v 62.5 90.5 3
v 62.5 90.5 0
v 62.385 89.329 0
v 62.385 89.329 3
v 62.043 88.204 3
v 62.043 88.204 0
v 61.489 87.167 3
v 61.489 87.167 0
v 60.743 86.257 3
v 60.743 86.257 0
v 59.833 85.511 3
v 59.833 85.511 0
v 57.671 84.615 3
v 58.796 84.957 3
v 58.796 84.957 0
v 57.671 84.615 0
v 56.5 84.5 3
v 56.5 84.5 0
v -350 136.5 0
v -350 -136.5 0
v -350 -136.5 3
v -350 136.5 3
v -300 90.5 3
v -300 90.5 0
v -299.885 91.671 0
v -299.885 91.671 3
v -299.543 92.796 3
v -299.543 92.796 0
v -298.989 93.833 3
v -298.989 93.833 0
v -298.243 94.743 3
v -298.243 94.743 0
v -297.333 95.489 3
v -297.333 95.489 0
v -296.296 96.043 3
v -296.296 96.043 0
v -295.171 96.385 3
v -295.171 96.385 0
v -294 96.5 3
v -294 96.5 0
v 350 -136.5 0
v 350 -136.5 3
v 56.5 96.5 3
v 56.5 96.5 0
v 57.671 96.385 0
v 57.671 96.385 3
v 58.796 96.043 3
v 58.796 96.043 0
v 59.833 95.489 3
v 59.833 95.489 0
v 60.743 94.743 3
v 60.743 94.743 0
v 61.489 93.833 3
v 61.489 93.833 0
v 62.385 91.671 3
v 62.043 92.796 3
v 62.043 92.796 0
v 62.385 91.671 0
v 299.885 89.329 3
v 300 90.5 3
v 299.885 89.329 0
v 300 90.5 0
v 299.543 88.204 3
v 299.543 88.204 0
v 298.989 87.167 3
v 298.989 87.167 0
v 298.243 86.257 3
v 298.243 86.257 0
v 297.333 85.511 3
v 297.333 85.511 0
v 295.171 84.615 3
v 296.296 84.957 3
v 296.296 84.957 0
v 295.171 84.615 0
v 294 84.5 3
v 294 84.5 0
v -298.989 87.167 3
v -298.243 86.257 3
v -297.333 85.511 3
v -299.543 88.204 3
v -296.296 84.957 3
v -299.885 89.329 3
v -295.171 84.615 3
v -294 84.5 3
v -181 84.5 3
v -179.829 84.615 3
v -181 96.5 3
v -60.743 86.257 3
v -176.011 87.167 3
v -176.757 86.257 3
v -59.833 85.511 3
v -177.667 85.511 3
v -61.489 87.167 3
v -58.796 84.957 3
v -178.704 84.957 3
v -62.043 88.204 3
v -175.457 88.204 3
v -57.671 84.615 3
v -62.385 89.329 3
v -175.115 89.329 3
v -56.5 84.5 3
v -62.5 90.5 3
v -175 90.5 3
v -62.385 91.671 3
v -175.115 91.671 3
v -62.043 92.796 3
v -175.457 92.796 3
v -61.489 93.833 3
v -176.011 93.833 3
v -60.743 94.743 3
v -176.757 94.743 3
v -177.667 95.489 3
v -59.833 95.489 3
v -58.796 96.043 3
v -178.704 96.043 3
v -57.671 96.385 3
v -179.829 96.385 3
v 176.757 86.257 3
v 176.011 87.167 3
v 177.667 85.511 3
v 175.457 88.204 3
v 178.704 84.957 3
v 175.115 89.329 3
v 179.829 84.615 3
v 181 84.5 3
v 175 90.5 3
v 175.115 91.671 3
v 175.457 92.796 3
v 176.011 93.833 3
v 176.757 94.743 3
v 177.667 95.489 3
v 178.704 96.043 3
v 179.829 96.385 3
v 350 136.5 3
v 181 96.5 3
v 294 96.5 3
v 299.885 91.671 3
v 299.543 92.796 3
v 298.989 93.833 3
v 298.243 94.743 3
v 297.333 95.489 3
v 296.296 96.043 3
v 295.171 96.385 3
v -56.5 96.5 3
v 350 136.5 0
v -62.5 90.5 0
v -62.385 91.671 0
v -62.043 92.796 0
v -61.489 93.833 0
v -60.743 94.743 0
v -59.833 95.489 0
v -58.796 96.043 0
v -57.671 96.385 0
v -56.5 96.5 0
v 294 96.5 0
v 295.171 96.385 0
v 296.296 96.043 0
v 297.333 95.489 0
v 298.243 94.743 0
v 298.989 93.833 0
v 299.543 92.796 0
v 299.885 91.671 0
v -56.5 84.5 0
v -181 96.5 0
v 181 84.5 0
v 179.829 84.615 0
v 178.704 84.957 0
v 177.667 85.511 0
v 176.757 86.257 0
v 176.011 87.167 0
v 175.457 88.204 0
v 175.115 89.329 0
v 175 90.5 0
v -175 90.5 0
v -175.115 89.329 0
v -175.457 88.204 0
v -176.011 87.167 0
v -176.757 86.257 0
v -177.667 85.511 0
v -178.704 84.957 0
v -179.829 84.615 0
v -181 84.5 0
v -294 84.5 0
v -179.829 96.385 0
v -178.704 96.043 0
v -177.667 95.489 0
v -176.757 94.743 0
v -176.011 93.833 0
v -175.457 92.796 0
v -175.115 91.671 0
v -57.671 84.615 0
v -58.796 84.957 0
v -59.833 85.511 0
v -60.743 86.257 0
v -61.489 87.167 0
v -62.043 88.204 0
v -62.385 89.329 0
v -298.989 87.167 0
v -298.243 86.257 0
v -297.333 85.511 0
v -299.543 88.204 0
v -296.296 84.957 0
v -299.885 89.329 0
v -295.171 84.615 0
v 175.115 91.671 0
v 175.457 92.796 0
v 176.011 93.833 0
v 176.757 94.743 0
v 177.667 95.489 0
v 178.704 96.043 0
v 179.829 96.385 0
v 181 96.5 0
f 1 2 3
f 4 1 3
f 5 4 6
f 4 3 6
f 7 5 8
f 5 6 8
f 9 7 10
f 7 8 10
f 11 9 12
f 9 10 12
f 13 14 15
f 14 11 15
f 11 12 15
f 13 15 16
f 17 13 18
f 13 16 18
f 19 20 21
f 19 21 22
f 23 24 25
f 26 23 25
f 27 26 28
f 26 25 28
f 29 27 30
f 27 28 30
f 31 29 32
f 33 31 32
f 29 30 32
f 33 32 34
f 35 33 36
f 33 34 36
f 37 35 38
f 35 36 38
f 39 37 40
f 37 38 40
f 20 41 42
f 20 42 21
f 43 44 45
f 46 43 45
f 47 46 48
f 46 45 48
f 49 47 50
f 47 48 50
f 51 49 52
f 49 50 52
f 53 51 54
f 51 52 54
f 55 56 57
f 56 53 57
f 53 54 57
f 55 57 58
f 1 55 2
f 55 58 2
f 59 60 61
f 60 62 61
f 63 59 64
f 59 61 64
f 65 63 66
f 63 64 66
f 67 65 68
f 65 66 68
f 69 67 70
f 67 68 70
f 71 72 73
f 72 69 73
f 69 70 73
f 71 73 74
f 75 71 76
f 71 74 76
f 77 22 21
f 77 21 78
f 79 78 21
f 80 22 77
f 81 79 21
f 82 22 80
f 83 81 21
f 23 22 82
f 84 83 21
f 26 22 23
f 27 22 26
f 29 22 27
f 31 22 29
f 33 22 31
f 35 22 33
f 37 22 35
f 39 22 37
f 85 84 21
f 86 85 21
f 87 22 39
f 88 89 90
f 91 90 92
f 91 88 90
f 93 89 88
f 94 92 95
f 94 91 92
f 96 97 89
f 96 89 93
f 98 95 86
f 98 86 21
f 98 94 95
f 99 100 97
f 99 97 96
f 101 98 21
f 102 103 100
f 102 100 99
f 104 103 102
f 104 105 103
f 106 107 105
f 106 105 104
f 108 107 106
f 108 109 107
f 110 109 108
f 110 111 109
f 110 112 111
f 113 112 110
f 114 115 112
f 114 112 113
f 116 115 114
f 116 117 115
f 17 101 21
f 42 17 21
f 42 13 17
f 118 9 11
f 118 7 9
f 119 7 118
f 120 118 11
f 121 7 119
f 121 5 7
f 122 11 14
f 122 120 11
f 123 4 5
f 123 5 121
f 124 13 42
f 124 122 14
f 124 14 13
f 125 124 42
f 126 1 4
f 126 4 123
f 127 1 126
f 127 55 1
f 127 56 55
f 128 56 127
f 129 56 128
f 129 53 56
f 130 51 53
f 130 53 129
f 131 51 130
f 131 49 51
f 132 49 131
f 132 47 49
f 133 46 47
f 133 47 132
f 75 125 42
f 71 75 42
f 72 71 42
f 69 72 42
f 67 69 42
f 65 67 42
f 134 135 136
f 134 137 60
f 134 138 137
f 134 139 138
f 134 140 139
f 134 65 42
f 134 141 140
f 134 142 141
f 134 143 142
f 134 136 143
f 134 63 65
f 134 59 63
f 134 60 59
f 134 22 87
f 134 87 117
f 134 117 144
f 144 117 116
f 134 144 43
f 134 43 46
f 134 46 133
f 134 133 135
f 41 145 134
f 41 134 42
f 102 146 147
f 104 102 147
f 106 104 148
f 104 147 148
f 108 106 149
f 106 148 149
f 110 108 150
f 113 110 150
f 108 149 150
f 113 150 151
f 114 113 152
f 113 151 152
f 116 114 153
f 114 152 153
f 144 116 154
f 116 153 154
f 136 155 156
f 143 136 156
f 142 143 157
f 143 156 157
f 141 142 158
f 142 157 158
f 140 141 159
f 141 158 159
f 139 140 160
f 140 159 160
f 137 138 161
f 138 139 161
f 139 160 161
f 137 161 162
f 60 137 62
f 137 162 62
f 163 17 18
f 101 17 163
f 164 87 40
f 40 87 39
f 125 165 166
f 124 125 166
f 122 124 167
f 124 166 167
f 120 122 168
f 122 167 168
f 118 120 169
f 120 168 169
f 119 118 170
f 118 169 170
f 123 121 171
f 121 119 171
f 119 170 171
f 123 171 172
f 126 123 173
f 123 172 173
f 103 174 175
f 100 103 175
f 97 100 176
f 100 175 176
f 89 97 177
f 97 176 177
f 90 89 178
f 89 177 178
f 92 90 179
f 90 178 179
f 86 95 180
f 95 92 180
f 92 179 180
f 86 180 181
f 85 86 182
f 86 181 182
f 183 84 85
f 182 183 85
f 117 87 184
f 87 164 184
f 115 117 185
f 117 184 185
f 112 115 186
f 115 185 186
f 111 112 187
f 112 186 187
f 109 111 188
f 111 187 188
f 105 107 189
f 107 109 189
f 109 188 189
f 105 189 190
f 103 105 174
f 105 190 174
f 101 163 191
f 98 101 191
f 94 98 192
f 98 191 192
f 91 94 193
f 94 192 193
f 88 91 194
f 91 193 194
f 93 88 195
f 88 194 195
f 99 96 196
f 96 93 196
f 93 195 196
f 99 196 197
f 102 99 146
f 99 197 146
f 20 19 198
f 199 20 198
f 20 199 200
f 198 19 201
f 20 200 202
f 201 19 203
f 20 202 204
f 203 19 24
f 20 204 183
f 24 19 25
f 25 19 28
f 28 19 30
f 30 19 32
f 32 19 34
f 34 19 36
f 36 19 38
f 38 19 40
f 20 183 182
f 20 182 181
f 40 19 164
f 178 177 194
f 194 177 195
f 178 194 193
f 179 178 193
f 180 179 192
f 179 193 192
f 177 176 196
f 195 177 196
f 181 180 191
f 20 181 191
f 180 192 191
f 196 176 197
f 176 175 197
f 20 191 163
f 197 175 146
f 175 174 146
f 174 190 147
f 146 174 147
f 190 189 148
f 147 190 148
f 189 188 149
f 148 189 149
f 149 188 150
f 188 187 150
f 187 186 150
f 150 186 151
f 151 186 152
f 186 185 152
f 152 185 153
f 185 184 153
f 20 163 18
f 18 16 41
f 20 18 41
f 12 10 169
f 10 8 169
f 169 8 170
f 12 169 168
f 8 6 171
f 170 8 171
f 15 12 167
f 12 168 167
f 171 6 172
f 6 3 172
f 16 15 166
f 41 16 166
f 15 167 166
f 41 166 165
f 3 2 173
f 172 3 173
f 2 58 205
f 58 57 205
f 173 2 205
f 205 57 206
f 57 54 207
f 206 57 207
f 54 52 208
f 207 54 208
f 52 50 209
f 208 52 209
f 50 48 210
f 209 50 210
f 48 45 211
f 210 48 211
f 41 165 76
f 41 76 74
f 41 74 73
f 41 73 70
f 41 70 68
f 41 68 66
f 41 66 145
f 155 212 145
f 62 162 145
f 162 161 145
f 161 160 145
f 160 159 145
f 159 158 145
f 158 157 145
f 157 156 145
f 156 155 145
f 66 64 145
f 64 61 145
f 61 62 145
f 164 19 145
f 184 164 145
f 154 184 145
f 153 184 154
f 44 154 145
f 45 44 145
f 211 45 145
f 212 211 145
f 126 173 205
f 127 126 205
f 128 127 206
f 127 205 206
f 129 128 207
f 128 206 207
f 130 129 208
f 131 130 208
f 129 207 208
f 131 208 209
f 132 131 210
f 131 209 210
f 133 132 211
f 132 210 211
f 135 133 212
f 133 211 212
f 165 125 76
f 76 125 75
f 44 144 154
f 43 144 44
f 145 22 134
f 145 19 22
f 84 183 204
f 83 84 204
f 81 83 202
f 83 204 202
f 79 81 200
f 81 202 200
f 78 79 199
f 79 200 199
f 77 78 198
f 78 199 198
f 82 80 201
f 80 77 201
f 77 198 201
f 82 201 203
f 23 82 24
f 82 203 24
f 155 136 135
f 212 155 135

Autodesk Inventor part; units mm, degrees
ref_plane "YZ Plane" through (0, 0, 0) normal (1, 0, 0) x (0, 1, 0)
ref_plane "XZ Plane" through (0, 0, 0) normal (0, 1, 0) x (-1, 0, 0)
ref_plane "XY Plane" through (0, 0, 0) normal (0, 0, 1) x (1, 0, 0)
sketch "Sketch1" plane through (0, 0, 0) normal (0, 0, 1) x (1, 0, 0)
  line L0 (350, -136.5) -> (-350, -136.5)
  line L1 (-350, -136.5) -> (-350, 136.5)
  line L2 (-350, 136.5) -> (350, 136.5)
  line L3 (350, 136.5) -> (350, -136.5)
  line L4 (350, -136.5) -> (-350, 136.5) construction
  line L5 (-350, -136.5) -> (350, 136.5) construction
  point P0 (0, 0)
  dimension "d0" = 273
  dimension "d1" = 700
extrude "Extrusion1" add sketch "Sketch1" along normal blind 3
sketch "Sketch5" plane through (0, 0, 3) normal (0, 0, 1) x (1, 0, 0)
  line L0 (-300, 84.5) -> (-175, 84.5)
  line L1 (-175, 84.5) -> (-175, 96.5)
  line L2 (-175, 96.5) -> (-300, 96.5)
  line L3 (-300, 96.5) -> (-300, 84.5)
  line L4 (-62.5, 96.5) -> (62.5, 96.5)
  line L5 (62.5, 96.5) -> (62.5, 84.5)
  line L6 (62.5, 84.5) -> (-62.5, 84.5)
  line L7 (-62.5, 84.5) -> (-62.5, 96.5)
  line L8 (350, 136.5) -> (-350, 136.5) projected
  line L9 (175, 84.5) -> (300, 84.5)
  line L10 (300, 84.5) -> (300, 96.5)
  line L11 (300, 96.5) -> (175, 96.5)
  line L12 (175, 96.5) -> (175, 84.5)
  line L13 (-350, 136.5) -> (-350, -136.5) projected
  point P0 (0, 0)
  dimension "d21" = 12
  dimension "d29" = 40
  dimension "d30" = 40
  dimension "d33" = 40
  dimension "d35" = 50
  dimension "d36" = 50
  dimension "d37" = 112.5
  dimension "d38" = 112.5
  dimension "d41" = 12
  dimension "d42" = 12
extrude "Extrusion5" cut sketch "Sketch5" against normal blind 10
fillet "Fillet5" radius 6 4 edges at (-300, 96.5, 1.5) (-300, 84.5, 1.5) (-175, 84.5, 1.5) (-175, 96.5, 1.5)
fillet "Fillet6" radius 6 8 edges at (-62.5, 96.5, 1.5) (-62.5, 84.5, 1.5) (62.5, 96.5, 1.5) (62.5, 84.5, 1.5) (175, 96.5, 1.5) (175, 84.5, 1.5) (300, 96.5, 1.5) (300, 84.5, 1.5)
equation "\"d30\" = d29"
equation "\"d33\" = d29"
equation "\"d41\" = d21"
equation "\"d42\" = d21"
equation "\"d40\" = 0.5 * d21"
equation "\"d43\" = 0.5 * d21"
properties part number "GBX_021.1-front-PMMA"
